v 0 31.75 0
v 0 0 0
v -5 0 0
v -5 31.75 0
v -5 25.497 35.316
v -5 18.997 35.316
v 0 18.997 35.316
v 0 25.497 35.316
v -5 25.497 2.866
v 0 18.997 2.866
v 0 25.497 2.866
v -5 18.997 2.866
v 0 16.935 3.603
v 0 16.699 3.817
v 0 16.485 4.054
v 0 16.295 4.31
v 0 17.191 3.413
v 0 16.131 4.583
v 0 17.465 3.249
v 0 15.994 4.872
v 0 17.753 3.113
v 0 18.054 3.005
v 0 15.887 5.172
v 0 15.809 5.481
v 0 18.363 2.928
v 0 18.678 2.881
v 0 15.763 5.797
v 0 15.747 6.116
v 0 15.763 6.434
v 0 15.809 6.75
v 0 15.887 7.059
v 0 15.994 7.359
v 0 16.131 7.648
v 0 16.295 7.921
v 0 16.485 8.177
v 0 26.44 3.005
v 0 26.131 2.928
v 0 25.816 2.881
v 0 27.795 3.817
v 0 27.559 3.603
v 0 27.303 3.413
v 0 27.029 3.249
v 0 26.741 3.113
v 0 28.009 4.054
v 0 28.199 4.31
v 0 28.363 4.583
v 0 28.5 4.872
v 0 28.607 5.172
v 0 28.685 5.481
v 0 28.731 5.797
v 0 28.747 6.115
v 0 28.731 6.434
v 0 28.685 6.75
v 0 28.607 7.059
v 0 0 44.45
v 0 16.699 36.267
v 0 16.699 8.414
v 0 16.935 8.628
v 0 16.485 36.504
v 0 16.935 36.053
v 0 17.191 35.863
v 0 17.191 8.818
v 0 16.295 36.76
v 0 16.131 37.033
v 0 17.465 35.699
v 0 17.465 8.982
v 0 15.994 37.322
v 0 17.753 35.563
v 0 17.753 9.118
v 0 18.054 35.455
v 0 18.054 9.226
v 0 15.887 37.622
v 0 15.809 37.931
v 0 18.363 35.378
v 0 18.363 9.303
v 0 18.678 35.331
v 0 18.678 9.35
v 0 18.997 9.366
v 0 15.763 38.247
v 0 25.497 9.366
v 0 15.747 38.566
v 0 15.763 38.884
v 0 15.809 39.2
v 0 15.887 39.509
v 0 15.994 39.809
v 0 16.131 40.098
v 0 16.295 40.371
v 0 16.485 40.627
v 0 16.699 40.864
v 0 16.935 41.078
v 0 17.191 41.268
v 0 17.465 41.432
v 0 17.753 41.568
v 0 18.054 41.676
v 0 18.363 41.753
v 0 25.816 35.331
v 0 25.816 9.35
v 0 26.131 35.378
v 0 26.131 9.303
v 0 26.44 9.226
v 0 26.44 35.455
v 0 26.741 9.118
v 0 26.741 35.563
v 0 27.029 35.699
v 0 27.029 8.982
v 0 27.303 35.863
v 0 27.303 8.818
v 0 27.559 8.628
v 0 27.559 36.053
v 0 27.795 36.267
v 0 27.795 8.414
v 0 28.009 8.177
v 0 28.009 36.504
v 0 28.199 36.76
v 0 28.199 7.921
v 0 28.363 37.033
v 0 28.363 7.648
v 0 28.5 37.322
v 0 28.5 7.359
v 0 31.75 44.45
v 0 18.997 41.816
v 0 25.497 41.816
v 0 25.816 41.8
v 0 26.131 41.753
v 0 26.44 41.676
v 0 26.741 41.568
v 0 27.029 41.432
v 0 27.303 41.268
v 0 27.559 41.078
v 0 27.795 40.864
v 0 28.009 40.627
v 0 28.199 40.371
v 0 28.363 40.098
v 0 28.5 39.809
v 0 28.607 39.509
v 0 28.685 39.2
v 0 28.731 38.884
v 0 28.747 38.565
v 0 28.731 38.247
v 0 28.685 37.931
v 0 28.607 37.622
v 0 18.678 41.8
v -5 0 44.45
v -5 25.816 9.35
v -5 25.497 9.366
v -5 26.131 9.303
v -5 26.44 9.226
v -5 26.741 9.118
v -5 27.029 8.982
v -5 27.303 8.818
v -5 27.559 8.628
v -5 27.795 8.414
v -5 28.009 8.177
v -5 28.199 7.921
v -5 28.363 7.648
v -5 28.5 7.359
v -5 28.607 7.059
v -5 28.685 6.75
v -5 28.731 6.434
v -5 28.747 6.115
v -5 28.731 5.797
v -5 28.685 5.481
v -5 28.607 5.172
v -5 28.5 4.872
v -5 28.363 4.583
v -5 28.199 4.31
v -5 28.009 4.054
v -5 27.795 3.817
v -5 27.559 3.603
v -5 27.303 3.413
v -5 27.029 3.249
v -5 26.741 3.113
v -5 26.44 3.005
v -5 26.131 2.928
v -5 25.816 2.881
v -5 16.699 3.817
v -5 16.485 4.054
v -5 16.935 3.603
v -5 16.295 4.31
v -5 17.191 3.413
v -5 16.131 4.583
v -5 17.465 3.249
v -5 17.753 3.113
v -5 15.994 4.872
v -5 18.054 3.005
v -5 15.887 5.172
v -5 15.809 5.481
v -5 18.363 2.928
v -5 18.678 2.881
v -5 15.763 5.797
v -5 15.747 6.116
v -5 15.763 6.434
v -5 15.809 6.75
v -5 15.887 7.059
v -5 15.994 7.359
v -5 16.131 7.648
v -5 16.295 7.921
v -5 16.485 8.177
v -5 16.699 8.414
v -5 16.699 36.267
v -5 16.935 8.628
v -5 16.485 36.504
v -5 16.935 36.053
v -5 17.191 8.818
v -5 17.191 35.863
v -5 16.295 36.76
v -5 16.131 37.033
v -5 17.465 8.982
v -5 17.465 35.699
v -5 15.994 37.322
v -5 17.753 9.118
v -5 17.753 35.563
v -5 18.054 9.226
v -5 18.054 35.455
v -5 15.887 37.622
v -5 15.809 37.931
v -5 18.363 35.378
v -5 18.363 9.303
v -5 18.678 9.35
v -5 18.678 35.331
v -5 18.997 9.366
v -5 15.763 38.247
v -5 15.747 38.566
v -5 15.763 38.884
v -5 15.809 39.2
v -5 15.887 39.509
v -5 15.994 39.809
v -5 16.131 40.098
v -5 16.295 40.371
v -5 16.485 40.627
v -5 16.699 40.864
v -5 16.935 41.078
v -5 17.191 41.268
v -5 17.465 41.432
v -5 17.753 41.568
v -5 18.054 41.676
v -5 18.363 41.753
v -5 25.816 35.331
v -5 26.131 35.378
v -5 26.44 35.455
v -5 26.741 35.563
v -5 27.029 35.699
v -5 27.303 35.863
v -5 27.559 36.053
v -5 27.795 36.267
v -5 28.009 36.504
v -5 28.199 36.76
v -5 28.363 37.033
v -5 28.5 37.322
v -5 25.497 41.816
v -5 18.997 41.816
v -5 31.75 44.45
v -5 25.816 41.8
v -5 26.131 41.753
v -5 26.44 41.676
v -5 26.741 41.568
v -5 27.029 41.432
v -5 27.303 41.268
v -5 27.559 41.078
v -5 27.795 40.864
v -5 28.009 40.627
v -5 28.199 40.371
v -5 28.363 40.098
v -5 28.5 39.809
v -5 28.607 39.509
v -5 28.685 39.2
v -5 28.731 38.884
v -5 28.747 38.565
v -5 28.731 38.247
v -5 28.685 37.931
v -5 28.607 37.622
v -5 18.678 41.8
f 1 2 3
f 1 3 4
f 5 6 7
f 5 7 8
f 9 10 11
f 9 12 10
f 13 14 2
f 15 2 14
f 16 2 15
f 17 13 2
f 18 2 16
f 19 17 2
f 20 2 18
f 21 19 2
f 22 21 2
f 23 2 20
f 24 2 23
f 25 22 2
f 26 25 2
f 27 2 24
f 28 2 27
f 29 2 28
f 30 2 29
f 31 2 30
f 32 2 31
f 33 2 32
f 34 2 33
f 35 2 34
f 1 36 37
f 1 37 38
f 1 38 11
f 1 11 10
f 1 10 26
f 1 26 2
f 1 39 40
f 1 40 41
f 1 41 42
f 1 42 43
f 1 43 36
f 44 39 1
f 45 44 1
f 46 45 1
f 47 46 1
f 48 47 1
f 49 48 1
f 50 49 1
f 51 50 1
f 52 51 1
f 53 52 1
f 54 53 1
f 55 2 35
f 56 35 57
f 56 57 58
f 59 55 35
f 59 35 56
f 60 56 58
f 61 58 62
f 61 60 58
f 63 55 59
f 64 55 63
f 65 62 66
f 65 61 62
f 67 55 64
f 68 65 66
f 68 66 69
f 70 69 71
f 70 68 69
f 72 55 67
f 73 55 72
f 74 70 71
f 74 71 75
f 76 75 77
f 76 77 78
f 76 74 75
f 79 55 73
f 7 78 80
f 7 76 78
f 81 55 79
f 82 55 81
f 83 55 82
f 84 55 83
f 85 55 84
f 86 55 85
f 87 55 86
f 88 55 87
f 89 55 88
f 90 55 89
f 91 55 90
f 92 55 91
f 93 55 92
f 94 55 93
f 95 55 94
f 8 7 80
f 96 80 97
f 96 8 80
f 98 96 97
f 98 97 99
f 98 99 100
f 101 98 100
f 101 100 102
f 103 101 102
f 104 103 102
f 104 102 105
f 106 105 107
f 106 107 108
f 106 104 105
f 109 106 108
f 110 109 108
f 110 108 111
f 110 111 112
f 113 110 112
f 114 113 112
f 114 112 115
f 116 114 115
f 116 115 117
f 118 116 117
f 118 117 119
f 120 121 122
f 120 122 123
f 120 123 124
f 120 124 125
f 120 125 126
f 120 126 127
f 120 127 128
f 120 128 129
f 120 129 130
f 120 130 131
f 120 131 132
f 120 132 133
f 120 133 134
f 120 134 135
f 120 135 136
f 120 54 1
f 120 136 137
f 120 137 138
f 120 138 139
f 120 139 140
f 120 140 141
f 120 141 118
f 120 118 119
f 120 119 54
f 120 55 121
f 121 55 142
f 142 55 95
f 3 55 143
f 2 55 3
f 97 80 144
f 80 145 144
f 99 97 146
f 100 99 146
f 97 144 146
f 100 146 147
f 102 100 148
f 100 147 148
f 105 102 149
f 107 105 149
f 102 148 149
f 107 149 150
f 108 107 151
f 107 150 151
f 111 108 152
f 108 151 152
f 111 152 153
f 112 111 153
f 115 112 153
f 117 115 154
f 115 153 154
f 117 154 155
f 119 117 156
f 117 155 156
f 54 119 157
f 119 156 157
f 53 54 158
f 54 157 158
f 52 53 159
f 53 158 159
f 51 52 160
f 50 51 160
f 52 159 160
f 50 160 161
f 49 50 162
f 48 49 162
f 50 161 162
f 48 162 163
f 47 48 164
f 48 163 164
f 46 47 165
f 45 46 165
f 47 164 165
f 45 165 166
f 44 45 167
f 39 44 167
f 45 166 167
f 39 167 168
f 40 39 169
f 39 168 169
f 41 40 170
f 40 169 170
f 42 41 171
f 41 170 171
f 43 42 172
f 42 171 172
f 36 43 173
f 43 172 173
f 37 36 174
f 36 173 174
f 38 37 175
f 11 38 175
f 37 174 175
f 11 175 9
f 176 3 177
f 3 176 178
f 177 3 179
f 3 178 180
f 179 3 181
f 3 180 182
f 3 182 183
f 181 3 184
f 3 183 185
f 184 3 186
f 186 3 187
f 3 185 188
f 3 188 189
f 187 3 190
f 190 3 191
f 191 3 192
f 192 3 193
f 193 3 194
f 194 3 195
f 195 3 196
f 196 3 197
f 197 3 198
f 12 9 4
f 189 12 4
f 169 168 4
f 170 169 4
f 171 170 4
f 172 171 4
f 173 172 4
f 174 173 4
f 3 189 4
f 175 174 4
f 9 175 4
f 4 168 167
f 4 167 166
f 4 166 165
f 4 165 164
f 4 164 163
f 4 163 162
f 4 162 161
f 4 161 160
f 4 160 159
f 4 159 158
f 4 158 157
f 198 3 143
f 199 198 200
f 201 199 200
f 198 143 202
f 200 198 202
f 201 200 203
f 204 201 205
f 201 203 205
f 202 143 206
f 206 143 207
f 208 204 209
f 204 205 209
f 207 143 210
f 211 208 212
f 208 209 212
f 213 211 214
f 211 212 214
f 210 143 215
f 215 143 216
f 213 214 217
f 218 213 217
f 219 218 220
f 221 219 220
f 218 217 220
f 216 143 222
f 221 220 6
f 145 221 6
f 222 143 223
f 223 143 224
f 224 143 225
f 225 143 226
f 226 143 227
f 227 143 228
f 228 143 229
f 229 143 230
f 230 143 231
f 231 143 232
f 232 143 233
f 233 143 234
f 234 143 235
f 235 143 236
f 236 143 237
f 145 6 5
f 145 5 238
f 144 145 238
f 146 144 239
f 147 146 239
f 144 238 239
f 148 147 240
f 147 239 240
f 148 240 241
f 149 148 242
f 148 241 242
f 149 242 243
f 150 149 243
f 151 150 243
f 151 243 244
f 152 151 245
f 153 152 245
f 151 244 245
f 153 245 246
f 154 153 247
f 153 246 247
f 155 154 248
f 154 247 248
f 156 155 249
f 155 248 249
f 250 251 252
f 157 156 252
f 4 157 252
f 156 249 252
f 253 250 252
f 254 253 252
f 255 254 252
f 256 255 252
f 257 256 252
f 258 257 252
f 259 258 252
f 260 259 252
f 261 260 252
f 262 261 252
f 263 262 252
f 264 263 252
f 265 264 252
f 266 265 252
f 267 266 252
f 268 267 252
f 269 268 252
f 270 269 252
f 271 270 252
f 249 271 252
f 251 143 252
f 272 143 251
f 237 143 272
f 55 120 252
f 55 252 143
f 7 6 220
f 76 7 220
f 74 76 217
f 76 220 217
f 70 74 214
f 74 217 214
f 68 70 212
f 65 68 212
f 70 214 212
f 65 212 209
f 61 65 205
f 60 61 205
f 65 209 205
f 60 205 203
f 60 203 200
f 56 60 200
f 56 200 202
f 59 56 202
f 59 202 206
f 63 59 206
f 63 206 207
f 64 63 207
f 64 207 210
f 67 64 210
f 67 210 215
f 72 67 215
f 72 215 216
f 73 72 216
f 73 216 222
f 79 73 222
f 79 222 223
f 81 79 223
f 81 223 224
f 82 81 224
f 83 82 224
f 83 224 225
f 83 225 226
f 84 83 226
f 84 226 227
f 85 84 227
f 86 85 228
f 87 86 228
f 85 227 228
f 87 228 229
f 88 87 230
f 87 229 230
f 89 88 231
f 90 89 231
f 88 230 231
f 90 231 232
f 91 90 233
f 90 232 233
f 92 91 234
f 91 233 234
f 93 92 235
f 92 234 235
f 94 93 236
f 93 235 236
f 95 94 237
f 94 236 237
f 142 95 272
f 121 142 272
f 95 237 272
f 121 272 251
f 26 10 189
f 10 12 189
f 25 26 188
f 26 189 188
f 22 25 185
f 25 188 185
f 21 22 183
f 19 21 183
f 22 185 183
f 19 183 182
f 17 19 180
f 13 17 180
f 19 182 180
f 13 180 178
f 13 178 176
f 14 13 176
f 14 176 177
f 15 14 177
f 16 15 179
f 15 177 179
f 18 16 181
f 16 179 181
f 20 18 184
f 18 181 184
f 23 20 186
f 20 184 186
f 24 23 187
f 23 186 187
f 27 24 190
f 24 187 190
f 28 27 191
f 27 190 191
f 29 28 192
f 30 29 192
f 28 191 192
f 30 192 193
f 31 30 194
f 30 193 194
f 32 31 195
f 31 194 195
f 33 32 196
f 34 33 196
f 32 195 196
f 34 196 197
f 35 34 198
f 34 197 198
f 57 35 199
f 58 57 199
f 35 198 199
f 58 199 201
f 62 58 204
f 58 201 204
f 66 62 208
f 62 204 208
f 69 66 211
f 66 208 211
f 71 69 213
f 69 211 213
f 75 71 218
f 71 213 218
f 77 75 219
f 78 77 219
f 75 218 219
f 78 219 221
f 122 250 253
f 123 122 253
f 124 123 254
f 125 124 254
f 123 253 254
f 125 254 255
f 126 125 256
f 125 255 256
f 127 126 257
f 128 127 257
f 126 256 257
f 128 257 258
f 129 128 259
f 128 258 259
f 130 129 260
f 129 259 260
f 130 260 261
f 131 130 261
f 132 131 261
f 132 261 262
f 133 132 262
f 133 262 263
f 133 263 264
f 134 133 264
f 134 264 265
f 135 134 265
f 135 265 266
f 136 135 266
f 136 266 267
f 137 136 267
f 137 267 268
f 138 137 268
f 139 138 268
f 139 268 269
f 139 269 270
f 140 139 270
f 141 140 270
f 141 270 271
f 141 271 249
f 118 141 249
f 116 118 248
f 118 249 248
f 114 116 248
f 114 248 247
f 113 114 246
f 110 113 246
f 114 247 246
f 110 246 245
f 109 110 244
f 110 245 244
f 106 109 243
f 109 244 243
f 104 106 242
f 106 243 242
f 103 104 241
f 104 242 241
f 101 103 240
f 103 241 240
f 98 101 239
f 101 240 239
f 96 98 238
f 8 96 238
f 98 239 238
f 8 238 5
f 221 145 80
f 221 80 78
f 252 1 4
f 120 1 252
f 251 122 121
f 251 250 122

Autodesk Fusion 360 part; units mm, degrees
sketch "Sketch1" plane through (0, 0, 0) normal (1, 0, 0) x (0, 1, 0) in component "Wing"
  line L0 (0, 0) -> (31.75, 0)
  line L1 (31.75, 0) -> (31.75, 44.45)
  line L2 (31.75, 44.45) -> (0, 44.45)
  line L3 (0, 44.45) -> (0, 0)
  dimension "d1" = 31.75
  dimension "d2" = 44.45
extrude "Extrude1" add sketch "Sketch1" against normal blind 5 makes body 1 in component "Wing"
sketch "Sketch3" plane through (-5, 0, 0) normal (-1, 0, 0) x (0, -1, 0) in component "Wing"
  line L0 (0, 0) -> (0, 44.45)
  line L1 (0, 44.45) -> (-31.75, 44.45)
  line L2 (-31.75, 44.45) -> (-31.75, 0)
  line L3 (-31.75, 0) -> (0, 0)
  line L4 (-25.497, 41.8155) -> (-18.997, 41.8155)
  line L5 (-18.997, 41.8155) -> (-18.997, 35.3155)
  line L6 (-18.997, 35.3155) -> (-25.497, 35.3155)
  line L7 (-25.497, 35.3155) -> (-25.497, 41.8155)
  circle A0 centre (-18.997, 38.5655) radius 3.25
  circle A1 centre (-25.497, 38.5655) radius 3.25
  dimension "d13" = 6.5
  dimension "d14" = 6.5
  dimension "d15" = 6.5
  dimension "d16" = 6.5
extrude "Extrude2" add sketch "Sketch3" against normal blind 5 separate body contours L7 A1 | L4 A0 A1 | L7 A1 | L5 A0 | L5 A0 | L6 A0 A1 makes body 2 in component "Wing"
copy_body "CopyPasteBodies1" bodies 2 makes body 3 in component "Wing"
move_body "Move1" bodies 3 to x (1, 0, 0) y (0, 1, 0) z (0, 0, 1) at (0, 0, -35.25) in component "Wing"
move_body "Move2" bodies 3 to x (1, 0, 0) y (0, 1, 0) z (0, 0, 1) at (0, 0, 2.8) in component "Wing"
combine "Combine1" operation cut target body 1 tool bodies 2 3 in component "Wing"
component "Wing" placed x (1, 0, 0) y (0, 1, 0) z (0, 0, 1) at (0, 0, 0)
